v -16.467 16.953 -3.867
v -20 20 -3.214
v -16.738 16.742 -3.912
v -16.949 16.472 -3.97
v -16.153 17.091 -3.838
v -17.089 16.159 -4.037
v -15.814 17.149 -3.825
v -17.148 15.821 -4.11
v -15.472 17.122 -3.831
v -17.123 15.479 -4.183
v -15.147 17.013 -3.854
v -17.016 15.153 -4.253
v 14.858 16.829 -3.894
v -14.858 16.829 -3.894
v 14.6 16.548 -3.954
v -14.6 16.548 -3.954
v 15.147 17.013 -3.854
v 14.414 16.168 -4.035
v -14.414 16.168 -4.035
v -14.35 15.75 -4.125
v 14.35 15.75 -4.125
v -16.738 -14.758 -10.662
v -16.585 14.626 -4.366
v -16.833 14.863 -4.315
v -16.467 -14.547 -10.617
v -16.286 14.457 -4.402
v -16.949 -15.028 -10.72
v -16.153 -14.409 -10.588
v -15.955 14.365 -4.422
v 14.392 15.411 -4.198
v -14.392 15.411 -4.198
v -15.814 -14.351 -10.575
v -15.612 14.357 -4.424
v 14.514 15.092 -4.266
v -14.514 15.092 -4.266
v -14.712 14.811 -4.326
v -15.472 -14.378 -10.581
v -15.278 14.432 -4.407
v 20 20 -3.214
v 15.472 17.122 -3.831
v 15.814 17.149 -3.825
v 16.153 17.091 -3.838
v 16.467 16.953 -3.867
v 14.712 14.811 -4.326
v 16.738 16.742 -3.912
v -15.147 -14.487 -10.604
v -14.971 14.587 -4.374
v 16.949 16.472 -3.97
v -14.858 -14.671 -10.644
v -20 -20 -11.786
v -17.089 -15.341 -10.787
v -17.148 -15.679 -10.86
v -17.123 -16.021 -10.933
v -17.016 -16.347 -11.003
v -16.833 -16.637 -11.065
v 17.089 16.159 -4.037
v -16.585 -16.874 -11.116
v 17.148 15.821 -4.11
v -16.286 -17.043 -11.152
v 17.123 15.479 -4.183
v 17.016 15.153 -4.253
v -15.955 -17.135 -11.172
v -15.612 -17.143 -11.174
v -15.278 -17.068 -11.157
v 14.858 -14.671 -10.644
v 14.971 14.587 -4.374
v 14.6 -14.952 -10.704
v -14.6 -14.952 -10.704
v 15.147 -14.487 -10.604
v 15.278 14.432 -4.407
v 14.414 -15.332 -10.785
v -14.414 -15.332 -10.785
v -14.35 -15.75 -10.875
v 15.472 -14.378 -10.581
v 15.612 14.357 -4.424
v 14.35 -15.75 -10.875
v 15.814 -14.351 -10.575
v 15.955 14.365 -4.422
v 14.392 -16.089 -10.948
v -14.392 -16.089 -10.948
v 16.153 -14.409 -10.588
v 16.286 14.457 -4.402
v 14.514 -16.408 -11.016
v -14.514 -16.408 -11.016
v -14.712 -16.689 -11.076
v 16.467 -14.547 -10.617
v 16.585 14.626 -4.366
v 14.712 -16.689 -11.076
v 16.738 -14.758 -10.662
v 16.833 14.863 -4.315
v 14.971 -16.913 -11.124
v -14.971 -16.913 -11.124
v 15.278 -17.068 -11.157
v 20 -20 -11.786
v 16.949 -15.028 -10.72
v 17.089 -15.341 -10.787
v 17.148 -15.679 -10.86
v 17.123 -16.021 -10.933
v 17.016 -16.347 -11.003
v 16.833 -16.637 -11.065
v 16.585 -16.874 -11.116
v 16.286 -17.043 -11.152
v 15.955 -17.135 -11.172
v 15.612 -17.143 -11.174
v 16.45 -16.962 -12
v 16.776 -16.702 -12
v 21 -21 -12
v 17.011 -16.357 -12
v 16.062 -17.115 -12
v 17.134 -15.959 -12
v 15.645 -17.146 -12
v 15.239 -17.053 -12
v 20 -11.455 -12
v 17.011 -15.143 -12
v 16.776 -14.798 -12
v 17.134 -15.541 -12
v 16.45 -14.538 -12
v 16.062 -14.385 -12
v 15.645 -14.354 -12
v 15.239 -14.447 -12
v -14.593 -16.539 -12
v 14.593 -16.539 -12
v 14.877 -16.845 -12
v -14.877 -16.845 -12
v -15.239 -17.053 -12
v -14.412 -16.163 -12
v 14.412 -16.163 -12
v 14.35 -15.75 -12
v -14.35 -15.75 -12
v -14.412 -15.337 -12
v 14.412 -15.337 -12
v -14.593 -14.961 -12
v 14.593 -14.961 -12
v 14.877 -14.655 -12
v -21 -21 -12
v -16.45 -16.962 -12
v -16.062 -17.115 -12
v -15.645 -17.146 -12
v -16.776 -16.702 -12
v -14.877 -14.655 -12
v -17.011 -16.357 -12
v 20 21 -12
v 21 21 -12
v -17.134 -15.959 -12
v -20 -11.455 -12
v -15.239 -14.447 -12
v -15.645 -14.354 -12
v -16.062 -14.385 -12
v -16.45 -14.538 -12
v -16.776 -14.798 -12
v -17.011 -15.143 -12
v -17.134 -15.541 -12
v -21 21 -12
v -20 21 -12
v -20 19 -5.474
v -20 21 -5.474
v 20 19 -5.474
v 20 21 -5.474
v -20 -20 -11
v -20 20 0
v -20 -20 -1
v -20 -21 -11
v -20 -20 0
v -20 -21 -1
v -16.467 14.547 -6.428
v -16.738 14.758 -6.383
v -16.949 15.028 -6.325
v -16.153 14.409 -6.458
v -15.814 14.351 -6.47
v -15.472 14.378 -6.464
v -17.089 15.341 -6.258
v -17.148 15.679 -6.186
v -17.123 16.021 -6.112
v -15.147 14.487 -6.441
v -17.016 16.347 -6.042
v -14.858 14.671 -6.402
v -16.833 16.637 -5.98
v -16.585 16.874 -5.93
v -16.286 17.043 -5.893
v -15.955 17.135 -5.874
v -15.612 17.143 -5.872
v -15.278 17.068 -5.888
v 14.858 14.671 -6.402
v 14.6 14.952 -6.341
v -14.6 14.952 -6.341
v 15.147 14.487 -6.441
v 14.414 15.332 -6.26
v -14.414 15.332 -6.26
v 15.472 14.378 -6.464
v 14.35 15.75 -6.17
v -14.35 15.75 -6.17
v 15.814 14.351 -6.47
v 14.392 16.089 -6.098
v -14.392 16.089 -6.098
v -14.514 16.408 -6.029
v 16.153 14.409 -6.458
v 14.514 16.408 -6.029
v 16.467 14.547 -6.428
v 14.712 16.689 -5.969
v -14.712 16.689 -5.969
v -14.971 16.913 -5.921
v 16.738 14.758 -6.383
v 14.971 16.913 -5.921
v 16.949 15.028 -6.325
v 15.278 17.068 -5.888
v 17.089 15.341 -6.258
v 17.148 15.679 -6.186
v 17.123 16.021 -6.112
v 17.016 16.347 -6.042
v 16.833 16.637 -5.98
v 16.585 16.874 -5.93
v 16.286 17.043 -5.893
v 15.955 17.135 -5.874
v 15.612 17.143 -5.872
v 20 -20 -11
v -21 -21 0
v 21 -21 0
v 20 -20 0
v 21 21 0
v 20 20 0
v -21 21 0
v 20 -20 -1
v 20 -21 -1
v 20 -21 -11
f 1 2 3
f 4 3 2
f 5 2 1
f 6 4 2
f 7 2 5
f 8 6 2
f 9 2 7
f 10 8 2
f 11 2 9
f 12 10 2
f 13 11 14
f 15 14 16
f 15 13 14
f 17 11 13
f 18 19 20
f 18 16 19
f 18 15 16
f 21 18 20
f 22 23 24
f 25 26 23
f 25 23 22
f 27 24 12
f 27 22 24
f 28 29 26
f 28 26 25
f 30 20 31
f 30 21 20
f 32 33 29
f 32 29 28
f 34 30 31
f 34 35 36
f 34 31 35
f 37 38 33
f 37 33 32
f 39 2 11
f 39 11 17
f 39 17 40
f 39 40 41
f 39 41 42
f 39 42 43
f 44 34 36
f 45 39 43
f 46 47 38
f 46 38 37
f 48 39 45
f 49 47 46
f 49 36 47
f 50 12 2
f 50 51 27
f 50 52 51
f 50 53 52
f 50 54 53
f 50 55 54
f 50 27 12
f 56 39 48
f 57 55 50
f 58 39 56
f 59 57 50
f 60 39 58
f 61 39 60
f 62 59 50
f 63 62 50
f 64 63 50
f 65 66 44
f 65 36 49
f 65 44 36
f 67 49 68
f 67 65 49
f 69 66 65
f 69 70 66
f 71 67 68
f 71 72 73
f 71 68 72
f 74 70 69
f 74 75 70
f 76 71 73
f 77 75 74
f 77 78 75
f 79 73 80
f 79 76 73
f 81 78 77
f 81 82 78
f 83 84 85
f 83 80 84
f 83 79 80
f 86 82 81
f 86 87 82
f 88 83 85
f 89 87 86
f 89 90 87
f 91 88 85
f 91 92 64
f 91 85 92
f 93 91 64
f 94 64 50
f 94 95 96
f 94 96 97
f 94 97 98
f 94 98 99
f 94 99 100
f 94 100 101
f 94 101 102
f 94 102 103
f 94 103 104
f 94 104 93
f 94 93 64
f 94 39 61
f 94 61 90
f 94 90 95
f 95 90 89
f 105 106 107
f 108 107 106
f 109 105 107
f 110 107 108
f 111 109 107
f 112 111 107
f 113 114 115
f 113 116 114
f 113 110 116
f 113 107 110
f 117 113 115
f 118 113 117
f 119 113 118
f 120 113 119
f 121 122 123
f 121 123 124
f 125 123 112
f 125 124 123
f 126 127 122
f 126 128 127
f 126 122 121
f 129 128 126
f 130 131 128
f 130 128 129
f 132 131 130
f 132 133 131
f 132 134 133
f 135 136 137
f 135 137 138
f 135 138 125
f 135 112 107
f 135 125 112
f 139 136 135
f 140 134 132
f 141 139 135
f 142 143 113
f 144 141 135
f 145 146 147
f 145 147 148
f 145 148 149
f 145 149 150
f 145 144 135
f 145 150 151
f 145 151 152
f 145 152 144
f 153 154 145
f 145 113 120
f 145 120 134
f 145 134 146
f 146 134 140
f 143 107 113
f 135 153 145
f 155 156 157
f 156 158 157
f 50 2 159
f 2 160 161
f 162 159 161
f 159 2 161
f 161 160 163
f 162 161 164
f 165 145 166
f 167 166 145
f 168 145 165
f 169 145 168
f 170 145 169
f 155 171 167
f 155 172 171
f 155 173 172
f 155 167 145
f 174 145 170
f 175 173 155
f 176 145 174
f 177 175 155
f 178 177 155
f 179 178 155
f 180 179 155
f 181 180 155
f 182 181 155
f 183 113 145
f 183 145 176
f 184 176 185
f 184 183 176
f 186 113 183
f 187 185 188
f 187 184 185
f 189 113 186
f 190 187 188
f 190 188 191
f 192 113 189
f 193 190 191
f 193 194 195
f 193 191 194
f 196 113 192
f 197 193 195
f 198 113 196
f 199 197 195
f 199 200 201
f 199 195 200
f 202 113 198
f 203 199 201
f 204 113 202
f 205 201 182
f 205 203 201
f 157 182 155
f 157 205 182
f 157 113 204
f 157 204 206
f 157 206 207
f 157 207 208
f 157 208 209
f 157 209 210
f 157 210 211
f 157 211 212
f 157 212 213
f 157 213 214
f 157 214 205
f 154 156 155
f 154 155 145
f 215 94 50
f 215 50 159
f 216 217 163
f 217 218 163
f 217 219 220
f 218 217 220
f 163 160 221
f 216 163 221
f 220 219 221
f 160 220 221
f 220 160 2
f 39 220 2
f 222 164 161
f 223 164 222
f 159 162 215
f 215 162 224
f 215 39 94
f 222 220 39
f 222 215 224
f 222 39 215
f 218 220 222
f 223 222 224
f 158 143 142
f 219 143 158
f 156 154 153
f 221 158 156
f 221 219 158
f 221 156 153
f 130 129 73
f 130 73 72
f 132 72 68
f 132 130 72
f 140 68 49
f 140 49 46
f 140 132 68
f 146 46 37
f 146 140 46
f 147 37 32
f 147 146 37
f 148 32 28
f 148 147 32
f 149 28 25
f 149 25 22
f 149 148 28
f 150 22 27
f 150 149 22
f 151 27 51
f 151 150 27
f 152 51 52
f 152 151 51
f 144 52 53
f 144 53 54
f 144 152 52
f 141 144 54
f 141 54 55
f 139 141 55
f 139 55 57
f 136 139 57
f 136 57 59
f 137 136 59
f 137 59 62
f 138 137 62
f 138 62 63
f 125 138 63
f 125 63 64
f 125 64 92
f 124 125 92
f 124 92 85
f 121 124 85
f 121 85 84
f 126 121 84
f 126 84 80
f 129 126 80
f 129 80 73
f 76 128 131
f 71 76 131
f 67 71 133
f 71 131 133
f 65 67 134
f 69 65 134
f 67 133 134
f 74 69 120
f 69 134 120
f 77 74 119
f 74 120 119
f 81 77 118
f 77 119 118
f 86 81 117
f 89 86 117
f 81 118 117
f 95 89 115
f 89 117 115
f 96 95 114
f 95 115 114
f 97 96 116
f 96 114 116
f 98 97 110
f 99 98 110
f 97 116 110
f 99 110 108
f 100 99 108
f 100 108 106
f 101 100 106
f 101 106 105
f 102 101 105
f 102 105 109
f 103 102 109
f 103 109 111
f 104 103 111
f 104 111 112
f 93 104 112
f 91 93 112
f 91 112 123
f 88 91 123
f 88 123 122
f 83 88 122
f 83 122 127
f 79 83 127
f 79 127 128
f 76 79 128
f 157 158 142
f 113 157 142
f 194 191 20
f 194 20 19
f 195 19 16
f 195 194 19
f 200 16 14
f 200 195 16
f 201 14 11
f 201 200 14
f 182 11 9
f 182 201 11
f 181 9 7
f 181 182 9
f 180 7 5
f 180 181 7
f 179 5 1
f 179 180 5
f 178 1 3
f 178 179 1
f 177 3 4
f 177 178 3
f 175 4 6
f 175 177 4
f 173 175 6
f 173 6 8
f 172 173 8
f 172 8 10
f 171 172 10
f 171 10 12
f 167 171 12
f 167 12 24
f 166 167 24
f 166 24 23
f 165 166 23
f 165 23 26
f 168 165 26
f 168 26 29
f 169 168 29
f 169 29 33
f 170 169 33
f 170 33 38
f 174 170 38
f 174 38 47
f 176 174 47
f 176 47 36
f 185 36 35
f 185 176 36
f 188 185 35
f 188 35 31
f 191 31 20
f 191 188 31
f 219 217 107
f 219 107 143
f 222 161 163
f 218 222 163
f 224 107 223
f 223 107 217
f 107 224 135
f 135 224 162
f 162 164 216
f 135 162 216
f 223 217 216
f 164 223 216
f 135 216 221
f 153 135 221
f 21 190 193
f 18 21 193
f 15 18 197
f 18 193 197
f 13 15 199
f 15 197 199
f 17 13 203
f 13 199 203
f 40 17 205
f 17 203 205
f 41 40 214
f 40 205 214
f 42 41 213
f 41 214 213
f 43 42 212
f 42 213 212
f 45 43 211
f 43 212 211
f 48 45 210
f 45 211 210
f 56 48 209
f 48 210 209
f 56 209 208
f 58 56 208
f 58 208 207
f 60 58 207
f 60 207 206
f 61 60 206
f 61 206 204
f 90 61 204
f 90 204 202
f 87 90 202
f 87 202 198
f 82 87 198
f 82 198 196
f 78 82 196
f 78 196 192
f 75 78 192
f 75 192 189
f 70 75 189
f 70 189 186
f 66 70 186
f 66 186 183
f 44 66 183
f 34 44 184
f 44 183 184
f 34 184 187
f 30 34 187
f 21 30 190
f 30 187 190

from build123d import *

# Parameters (mm, degrees)
F0_W     = 21
F0_H     = 42
F1_DEPTH = 12
F2_D     = 2.8
F3_W     = 2
F3_H     = 6.526026
F4_DEPTH = 20
F6_W     = 40
F6_H     = 10
F7_DEPTH = 1


with BuildPart() as f1:
    # F0 (on Top) → F1 (new body)
    with BuildSketch(Plane.XY):
        with Locations((10.5, 0)):
            Rectangle(F0_W, F0_H)
    extrude(amount=-F1_DEPTH)

    # F2 (through all)
    with Locations(Plane.XY):
        with Locations((15.75, 15.75), (15.75, -15.75)):
            Hole(F2_D / 2)

    # F3 (on face) → F4 (cut)
    with BuildSketch(Plane(origin=(0, 0, 0), x_dir=(0, -1, 0), z_dir=(-1, 0, 0))):
        Polygon((-20, 0), (-20, -3.214286), (20, -11.785714), (20, 0), align=None)
        Polygon((11.454786, -12), (-19, -5.473974), (-19, -12), align=None)
        with Locations((-20, -8.736987)):
            Rectangle(F3_W, F3_H)
    extrude(amount=-F4_DEPTH, mode=Mode.SUBTRACT)

    # F5: F1 across face


with BuildPart() as f1_1:
    add(f1.part)
    add(f1.part.mirror(Plane(origin=(0, 0.027427, -7.493387), x_dir=(0, -1, 0), z_dir=(-1, 0, 0))))

    # F6 (on face) → F7 (cut)
    with BuildSketch(Plane.XZ.offset(21)):
        with Locations((0, -6)):
            Rectangle(F6_W, F6_H)
    extrude(amount=-F7_DEPTH, mode=Mode.SUBTRACT)


solid = f1_1.part
